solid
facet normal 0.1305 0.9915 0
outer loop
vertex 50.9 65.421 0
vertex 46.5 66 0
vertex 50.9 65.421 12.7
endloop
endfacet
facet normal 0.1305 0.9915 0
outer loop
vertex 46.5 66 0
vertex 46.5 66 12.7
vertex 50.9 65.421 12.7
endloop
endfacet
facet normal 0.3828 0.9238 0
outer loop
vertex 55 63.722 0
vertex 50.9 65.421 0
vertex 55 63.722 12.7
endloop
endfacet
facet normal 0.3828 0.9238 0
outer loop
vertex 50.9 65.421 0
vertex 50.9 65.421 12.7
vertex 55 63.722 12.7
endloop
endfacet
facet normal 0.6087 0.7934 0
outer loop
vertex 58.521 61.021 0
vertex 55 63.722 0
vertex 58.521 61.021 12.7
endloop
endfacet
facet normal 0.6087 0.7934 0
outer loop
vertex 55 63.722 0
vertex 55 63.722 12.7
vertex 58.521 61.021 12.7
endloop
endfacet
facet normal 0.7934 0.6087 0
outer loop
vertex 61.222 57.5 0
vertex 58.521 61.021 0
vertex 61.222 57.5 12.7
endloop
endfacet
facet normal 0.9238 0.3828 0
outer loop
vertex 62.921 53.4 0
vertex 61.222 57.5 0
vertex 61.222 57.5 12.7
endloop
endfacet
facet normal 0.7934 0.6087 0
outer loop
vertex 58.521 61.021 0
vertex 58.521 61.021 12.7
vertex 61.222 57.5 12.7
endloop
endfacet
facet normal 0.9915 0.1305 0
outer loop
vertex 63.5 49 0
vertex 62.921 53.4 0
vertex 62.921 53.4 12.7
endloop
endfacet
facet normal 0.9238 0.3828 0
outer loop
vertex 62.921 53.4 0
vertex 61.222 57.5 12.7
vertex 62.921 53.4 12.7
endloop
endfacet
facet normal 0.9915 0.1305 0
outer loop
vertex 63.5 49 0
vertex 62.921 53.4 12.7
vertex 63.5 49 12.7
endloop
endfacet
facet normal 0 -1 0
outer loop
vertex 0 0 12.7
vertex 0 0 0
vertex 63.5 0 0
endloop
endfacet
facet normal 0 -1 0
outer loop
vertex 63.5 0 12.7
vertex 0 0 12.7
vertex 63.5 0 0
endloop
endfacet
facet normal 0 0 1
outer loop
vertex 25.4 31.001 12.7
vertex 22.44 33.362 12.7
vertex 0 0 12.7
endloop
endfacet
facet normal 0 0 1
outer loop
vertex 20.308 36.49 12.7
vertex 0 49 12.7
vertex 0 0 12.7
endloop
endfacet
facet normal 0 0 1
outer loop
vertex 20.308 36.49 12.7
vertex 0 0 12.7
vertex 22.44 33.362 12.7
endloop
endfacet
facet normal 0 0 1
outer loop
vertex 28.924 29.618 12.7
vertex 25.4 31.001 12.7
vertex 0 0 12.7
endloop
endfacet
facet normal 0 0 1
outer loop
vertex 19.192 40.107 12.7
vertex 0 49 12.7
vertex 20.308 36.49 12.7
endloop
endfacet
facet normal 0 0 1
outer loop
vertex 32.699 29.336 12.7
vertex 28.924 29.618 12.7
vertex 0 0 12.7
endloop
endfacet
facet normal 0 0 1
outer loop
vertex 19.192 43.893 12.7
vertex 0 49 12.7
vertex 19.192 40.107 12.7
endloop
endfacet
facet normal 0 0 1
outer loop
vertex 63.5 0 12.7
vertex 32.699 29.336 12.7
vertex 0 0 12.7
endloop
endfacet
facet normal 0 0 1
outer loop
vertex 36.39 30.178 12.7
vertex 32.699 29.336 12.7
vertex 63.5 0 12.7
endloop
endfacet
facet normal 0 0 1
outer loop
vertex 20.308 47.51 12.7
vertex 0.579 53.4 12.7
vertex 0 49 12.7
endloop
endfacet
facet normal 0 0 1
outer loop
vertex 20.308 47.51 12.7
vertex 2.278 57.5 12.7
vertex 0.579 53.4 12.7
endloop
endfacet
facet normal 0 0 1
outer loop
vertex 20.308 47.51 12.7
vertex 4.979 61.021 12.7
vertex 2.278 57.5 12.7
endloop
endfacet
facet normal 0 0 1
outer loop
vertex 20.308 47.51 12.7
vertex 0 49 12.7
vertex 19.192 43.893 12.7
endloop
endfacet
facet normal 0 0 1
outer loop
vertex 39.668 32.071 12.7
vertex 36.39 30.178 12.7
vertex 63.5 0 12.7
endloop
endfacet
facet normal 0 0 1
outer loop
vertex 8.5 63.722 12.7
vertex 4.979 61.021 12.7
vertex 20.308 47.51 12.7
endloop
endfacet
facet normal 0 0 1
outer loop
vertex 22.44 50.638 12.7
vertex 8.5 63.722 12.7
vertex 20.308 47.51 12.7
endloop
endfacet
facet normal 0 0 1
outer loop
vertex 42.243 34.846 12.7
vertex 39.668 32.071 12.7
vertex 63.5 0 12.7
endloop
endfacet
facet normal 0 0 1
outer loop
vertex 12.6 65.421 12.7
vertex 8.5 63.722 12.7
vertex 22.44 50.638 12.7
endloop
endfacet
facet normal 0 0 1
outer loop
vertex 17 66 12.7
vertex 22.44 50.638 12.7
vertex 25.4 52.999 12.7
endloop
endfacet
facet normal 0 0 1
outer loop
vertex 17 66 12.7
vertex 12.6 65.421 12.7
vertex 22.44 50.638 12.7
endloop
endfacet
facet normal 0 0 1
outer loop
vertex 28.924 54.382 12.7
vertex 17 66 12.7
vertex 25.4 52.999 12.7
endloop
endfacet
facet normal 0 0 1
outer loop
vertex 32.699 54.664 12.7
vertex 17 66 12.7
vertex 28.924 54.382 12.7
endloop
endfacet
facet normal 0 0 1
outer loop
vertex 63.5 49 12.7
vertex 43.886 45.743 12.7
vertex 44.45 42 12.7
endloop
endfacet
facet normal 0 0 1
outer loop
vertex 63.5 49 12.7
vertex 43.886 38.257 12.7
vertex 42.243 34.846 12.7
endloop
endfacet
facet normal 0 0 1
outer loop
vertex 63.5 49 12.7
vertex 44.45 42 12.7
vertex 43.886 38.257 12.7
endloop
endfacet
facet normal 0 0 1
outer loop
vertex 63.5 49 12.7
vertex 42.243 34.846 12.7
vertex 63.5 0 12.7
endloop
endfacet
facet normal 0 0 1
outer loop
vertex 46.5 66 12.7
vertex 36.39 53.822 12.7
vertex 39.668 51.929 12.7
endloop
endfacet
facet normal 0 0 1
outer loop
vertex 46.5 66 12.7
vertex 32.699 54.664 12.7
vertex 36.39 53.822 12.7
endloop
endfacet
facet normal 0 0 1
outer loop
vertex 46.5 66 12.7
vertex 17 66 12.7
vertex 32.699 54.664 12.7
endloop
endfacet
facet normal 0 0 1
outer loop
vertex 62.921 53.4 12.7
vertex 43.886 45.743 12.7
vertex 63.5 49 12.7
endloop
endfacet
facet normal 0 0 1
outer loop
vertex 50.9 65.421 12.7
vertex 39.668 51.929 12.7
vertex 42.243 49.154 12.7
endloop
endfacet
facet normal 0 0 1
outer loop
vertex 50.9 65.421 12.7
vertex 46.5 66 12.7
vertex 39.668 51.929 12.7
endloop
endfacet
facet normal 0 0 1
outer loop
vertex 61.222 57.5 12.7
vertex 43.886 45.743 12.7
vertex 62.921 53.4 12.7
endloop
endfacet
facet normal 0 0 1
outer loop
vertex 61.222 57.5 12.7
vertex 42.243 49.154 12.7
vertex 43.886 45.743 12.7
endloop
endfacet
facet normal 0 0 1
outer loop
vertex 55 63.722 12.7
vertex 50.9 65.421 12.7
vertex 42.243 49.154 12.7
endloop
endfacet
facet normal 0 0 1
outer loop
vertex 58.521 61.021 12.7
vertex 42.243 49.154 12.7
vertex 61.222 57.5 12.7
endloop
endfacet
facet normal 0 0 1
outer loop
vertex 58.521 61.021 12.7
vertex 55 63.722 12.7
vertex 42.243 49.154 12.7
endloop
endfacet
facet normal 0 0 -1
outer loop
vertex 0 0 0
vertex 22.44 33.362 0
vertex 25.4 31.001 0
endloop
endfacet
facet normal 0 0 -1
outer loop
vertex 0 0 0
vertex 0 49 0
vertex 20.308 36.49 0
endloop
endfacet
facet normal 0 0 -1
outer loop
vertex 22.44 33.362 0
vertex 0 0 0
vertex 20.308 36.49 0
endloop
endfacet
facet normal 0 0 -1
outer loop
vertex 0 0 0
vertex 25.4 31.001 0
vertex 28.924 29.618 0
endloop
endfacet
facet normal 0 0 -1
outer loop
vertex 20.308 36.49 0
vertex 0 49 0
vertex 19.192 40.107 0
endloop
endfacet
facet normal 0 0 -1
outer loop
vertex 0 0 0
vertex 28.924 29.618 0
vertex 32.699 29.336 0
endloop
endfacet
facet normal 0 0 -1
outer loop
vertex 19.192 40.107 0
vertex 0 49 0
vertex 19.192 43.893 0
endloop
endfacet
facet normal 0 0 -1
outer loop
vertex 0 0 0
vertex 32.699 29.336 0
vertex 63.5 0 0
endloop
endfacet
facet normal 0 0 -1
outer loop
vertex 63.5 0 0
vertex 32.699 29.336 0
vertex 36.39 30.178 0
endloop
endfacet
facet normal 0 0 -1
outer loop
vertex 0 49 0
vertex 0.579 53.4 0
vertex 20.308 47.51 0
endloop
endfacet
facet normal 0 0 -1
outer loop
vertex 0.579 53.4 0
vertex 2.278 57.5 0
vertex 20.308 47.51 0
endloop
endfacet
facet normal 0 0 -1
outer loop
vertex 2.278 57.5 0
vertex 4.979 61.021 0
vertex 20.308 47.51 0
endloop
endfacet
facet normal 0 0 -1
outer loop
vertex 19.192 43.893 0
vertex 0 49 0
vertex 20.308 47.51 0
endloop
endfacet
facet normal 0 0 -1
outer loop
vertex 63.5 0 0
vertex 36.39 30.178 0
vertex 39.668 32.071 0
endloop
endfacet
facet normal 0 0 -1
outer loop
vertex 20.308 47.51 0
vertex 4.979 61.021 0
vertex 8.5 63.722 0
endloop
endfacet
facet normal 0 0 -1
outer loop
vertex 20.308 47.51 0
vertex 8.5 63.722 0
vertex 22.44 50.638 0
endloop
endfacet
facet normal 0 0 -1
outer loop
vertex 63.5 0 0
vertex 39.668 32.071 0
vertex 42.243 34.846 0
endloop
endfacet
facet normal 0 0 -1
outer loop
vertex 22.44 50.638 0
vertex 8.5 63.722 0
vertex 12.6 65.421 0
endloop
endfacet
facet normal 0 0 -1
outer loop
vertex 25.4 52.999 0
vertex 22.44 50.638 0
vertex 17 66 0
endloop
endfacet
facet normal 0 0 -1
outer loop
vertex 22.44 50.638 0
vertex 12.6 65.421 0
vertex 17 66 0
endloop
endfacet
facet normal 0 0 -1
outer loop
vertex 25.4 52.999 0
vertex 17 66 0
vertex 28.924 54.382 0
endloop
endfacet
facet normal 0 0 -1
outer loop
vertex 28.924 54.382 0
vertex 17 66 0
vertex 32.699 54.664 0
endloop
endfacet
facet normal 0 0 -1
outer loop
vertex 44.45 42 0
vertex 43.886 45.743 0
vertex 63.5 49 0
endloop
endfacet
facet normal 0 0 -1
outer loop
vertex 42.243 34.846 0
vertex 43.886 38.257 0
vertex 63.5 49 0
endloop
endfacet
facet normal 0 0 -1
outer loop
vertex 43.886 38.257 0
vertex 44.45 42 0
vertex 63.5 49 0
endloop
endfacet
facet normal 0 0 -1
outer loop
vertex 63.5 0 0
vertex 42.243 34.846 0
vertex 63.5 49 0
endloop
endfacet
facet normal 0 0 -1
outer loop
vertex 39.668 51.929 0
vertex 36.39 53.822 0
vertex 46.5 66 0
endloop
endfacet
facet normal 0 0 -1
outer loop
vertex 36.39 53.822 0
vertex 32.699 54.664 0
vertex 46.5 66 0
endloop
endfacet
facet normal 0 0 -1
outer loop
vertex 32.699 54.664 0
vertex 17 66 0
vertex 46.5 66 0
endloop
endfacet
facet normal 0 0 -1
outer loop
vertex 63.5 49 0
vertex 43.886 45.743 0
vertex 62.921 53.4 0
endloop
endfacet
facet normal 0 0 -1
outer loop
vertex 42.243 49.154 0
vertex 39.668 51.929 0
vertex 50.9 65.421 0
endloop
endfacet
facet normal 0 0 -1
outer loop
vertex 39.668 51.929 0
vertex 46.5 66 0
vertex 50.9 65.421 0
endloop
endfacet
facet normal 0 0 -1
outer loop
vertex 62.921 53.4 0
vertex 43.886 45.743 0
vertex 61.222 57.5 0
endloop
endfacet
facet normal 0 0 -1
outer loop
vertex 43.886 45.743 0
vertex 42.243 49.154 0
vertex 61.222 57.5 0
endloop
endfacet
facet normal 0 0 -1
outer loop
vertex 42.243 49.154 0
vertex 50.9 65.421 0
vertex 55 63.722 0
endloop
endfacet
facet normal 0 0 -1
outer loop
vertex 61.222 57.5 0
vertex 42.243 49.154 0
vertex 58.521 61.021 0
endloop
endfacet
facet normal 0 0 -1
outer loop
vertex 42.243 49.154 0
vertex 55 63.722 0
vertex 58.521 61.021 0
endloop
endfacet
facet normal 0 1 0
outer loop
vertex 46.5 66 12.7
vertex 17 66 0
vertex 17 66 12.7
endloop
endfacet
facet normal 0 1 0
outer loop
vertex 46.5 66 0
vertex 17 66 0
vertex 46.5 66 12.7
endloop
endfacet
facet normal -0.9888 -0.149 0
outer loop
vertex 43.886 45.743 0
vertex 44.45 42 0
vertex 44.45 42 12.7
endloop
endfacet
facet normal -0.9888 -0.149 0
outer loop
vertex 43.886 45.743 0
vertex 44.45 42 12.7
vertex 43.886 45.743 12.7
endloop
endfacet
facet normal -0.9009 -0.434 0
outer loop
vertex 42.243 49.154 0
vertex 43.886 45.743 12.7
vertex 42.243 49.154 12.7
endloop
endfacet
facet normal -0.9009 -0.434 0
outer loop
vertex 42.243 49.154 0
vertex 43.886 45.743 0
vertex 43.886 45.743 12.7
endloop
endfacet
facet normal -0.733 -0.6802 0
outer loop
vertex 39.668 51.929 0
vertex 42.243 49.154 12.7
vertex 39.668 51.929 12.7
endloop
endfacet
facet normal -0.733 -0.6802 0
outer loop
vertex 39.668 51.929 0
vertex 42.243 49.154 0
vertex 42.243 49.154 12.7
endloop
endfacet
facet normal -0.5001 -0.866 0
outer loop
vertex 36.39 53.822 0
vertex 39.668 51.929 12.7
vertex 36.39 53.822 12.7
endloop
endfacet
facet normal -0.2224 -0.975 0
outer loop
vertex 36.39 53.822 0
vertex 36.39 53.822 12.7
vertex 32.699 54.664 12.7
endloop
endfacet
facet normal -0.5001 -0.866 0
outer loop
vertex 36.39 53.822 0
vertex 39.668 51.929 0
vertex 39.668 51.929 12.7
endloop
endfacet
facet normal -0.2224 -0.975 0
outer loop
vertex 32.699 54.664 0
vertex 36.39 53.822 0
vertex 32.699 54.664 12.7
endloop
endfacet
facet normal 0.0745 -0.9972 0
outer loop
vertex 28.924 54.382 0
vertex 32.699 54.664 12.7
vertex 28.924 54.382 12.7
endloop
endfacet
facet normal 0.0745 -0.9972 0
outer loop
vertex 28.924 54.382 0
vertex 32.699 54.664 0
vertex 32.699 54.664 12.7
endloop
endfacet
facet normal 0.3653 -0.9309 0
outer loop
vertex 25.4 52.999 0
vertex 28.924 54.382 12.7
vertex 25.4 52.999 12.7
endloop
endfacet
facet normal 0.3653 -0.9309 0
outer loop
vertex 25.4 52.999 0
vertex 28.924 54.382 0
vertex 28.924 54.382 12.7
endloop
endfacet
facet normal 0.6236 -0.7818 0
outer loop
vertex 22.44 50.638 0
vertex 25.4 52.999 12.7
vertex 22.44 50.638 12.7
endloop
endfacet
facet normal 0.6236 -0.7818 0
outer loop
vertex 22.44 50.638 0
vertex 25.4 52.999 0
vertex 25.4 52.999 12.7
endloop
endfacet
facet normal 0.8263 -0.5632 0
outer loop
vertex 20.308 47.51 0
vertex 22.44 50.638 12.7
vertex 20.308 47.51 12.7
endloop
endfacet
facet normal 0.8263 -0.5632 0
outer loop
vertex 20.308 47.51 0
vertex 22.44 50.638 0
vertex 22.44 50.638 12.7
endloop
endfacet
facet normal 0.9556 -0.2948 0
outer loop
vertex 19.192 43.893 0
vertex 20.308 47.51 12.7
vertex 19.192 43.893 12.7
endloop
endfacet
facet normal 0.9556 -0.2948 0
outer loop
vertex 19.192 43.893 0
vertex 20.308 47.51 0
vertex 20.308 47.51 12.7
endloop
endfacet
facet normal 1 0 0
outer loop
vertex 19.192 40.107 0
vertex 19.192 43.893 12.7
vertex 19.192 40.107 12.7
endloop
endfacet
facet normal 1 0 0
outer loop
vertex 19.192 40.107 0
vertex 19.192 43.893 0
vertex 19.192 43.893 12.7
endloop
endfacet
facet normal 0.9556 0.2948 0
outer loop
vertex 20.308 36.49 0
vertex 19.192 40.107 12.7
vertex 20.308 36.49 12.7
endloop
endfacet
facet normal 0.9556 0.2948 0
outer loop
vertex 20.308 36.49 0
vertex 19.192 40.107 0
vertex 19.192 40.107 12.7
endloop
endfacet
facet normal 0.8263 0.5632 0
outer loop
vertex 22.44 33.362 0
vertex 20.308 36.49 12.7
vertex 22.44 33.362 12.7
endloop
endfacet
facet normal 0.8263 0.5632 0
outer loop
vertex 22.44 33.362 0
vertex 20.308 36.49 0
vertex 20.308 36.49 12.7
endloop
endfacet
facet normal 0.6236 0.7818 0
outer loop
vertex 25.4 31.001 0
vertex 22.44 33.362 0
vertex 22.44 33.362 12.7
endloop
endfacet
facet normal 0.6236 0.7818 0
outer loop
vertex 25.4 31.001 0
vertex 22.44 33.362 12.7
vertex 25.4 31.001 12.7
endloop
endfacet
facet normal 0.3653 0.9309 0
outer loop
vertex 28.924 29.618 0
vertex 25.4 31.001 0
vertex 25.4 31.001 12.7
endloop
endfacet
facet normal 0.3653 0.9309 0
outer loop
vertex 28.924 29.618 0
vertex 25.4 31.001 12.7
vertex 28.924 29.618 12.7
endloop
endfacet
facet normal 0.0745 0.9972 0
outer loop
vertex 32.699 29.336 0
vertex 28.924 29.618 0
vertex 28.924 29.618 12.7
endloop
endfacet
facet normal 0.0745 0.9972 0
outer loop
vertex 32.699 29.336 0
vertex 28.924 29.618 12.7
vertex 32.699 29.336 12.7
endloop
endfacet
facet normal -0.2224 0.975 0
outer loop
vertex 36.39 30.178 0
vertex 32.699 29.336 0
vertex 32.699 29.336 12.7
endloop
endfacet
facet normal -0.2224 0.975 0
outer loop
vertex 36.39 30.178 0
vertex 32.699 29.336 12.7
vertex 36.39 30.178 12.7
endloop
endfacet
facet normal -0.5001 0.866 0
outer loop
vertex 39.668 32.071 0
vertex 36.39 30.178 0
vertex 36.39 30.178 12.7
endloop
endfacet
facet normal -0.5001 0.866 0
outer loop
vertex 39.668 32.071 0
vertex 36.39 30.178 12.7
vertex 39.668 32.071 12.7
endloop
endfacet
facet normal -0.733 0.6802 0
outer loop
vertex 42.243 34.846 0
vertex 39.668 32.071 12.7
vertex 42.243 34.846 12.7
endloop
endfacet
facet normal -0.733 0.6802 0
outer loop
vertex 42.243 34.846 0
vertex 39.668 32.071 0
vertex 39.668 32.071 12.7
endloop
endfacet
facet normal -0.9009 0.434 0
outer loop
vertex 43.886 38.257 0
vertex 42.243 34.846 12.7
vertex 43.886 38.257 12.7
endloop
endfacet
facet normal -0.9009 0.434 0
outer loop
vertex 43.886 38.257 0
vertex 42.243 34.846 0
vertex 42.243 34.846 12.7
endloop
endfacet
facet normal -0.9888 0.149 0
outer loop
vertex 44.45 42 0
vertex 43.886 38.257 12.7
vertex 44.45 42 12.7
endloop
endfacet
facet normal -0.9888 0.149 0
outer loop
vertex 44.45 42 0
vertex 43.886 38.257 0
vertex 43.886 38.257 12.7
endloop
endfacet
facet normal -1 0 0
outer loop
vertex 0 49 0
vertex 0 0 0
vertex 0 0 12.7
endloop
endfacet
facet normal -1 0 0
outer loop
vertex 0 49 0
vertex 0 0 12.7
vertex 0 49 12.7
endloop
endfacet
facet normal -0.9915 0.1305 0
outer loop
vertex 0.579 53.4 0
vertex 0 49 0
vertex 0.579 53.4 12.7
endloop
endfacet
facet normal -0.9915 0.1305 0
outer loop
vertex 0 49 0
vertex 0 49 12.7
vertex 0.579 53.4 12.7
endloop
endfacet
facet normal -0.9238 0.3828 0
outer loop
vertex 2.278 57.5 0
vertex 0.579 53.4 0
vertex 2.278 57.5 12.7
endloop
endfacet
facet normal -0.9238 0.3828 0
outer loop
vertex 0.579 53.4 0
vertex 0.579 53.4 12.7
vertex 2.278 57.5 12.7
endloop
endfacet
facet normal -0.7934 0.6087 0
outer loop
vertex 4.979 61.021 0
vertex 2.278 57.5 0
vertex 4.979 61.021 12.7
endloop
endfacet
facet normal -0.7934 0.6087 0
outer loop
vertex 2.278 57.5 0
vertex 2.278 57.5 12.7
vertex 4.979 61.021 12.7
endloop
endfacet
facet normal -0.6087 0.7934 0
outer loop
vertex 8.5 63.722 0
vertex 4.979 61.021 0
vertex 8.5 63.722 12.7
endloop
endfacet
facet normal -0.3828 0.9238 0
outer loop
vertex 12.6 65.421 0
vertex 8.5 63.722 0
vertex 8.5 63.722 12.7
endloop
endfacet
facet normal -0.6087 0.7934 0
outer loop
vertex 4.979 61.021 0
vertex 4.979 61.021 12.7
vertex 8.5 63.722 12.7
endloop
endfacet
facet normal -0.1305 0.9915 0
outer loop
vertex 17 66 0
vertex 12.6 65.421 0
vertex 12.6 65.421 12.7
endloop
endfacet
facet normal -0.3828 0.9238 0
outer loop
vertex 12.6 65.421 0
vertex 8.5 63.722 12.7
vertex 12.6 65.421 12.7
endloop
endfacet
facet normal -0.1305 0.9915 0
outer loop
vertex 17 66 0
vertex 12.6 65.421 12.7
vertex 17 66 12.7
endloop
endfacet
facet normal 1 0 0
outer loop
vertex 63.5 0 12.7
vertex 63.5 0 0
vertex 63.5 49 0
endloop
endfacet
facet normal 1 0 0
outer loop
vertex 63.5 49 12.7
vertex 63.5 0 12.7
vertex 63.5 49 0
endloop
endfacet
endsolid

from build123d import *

# Parameters (mm, degrees)
CROQUIS1_W              = 63.5
CROQUIS1_H              = 66
CROQUIS1_R              = 12.7
SALIENTE_EXTRUIR1_DEPTH = 12.7
REDONDEO1_R             = 17


with BuildPart() as part:
    # Croquis1 → Saliente-Extruir1 (new body)
    with BuildSketch(Plane.XY):
        with Locations((31.75, 33)):
            Rectangle(CROQUIS1_W, CROQUIS1_H)
        with Locations((31.75, 42)):
            Circle(CROQUIS1_R, mode=Mode.SUBTRACT)
    extrude(amount=SALIENTE_EXTRUIR1_DEPTH)

    # Redondeo1
    redondeo1_edges = [part.edges().sort_by_distance(p)[0] for p in [
        (0, 66, 6.35),
        (63.5, 66, 6.35),
    ]]
    fillet(redondeo1_edges, radius=REDONDEO1_R)


solid = part.part
